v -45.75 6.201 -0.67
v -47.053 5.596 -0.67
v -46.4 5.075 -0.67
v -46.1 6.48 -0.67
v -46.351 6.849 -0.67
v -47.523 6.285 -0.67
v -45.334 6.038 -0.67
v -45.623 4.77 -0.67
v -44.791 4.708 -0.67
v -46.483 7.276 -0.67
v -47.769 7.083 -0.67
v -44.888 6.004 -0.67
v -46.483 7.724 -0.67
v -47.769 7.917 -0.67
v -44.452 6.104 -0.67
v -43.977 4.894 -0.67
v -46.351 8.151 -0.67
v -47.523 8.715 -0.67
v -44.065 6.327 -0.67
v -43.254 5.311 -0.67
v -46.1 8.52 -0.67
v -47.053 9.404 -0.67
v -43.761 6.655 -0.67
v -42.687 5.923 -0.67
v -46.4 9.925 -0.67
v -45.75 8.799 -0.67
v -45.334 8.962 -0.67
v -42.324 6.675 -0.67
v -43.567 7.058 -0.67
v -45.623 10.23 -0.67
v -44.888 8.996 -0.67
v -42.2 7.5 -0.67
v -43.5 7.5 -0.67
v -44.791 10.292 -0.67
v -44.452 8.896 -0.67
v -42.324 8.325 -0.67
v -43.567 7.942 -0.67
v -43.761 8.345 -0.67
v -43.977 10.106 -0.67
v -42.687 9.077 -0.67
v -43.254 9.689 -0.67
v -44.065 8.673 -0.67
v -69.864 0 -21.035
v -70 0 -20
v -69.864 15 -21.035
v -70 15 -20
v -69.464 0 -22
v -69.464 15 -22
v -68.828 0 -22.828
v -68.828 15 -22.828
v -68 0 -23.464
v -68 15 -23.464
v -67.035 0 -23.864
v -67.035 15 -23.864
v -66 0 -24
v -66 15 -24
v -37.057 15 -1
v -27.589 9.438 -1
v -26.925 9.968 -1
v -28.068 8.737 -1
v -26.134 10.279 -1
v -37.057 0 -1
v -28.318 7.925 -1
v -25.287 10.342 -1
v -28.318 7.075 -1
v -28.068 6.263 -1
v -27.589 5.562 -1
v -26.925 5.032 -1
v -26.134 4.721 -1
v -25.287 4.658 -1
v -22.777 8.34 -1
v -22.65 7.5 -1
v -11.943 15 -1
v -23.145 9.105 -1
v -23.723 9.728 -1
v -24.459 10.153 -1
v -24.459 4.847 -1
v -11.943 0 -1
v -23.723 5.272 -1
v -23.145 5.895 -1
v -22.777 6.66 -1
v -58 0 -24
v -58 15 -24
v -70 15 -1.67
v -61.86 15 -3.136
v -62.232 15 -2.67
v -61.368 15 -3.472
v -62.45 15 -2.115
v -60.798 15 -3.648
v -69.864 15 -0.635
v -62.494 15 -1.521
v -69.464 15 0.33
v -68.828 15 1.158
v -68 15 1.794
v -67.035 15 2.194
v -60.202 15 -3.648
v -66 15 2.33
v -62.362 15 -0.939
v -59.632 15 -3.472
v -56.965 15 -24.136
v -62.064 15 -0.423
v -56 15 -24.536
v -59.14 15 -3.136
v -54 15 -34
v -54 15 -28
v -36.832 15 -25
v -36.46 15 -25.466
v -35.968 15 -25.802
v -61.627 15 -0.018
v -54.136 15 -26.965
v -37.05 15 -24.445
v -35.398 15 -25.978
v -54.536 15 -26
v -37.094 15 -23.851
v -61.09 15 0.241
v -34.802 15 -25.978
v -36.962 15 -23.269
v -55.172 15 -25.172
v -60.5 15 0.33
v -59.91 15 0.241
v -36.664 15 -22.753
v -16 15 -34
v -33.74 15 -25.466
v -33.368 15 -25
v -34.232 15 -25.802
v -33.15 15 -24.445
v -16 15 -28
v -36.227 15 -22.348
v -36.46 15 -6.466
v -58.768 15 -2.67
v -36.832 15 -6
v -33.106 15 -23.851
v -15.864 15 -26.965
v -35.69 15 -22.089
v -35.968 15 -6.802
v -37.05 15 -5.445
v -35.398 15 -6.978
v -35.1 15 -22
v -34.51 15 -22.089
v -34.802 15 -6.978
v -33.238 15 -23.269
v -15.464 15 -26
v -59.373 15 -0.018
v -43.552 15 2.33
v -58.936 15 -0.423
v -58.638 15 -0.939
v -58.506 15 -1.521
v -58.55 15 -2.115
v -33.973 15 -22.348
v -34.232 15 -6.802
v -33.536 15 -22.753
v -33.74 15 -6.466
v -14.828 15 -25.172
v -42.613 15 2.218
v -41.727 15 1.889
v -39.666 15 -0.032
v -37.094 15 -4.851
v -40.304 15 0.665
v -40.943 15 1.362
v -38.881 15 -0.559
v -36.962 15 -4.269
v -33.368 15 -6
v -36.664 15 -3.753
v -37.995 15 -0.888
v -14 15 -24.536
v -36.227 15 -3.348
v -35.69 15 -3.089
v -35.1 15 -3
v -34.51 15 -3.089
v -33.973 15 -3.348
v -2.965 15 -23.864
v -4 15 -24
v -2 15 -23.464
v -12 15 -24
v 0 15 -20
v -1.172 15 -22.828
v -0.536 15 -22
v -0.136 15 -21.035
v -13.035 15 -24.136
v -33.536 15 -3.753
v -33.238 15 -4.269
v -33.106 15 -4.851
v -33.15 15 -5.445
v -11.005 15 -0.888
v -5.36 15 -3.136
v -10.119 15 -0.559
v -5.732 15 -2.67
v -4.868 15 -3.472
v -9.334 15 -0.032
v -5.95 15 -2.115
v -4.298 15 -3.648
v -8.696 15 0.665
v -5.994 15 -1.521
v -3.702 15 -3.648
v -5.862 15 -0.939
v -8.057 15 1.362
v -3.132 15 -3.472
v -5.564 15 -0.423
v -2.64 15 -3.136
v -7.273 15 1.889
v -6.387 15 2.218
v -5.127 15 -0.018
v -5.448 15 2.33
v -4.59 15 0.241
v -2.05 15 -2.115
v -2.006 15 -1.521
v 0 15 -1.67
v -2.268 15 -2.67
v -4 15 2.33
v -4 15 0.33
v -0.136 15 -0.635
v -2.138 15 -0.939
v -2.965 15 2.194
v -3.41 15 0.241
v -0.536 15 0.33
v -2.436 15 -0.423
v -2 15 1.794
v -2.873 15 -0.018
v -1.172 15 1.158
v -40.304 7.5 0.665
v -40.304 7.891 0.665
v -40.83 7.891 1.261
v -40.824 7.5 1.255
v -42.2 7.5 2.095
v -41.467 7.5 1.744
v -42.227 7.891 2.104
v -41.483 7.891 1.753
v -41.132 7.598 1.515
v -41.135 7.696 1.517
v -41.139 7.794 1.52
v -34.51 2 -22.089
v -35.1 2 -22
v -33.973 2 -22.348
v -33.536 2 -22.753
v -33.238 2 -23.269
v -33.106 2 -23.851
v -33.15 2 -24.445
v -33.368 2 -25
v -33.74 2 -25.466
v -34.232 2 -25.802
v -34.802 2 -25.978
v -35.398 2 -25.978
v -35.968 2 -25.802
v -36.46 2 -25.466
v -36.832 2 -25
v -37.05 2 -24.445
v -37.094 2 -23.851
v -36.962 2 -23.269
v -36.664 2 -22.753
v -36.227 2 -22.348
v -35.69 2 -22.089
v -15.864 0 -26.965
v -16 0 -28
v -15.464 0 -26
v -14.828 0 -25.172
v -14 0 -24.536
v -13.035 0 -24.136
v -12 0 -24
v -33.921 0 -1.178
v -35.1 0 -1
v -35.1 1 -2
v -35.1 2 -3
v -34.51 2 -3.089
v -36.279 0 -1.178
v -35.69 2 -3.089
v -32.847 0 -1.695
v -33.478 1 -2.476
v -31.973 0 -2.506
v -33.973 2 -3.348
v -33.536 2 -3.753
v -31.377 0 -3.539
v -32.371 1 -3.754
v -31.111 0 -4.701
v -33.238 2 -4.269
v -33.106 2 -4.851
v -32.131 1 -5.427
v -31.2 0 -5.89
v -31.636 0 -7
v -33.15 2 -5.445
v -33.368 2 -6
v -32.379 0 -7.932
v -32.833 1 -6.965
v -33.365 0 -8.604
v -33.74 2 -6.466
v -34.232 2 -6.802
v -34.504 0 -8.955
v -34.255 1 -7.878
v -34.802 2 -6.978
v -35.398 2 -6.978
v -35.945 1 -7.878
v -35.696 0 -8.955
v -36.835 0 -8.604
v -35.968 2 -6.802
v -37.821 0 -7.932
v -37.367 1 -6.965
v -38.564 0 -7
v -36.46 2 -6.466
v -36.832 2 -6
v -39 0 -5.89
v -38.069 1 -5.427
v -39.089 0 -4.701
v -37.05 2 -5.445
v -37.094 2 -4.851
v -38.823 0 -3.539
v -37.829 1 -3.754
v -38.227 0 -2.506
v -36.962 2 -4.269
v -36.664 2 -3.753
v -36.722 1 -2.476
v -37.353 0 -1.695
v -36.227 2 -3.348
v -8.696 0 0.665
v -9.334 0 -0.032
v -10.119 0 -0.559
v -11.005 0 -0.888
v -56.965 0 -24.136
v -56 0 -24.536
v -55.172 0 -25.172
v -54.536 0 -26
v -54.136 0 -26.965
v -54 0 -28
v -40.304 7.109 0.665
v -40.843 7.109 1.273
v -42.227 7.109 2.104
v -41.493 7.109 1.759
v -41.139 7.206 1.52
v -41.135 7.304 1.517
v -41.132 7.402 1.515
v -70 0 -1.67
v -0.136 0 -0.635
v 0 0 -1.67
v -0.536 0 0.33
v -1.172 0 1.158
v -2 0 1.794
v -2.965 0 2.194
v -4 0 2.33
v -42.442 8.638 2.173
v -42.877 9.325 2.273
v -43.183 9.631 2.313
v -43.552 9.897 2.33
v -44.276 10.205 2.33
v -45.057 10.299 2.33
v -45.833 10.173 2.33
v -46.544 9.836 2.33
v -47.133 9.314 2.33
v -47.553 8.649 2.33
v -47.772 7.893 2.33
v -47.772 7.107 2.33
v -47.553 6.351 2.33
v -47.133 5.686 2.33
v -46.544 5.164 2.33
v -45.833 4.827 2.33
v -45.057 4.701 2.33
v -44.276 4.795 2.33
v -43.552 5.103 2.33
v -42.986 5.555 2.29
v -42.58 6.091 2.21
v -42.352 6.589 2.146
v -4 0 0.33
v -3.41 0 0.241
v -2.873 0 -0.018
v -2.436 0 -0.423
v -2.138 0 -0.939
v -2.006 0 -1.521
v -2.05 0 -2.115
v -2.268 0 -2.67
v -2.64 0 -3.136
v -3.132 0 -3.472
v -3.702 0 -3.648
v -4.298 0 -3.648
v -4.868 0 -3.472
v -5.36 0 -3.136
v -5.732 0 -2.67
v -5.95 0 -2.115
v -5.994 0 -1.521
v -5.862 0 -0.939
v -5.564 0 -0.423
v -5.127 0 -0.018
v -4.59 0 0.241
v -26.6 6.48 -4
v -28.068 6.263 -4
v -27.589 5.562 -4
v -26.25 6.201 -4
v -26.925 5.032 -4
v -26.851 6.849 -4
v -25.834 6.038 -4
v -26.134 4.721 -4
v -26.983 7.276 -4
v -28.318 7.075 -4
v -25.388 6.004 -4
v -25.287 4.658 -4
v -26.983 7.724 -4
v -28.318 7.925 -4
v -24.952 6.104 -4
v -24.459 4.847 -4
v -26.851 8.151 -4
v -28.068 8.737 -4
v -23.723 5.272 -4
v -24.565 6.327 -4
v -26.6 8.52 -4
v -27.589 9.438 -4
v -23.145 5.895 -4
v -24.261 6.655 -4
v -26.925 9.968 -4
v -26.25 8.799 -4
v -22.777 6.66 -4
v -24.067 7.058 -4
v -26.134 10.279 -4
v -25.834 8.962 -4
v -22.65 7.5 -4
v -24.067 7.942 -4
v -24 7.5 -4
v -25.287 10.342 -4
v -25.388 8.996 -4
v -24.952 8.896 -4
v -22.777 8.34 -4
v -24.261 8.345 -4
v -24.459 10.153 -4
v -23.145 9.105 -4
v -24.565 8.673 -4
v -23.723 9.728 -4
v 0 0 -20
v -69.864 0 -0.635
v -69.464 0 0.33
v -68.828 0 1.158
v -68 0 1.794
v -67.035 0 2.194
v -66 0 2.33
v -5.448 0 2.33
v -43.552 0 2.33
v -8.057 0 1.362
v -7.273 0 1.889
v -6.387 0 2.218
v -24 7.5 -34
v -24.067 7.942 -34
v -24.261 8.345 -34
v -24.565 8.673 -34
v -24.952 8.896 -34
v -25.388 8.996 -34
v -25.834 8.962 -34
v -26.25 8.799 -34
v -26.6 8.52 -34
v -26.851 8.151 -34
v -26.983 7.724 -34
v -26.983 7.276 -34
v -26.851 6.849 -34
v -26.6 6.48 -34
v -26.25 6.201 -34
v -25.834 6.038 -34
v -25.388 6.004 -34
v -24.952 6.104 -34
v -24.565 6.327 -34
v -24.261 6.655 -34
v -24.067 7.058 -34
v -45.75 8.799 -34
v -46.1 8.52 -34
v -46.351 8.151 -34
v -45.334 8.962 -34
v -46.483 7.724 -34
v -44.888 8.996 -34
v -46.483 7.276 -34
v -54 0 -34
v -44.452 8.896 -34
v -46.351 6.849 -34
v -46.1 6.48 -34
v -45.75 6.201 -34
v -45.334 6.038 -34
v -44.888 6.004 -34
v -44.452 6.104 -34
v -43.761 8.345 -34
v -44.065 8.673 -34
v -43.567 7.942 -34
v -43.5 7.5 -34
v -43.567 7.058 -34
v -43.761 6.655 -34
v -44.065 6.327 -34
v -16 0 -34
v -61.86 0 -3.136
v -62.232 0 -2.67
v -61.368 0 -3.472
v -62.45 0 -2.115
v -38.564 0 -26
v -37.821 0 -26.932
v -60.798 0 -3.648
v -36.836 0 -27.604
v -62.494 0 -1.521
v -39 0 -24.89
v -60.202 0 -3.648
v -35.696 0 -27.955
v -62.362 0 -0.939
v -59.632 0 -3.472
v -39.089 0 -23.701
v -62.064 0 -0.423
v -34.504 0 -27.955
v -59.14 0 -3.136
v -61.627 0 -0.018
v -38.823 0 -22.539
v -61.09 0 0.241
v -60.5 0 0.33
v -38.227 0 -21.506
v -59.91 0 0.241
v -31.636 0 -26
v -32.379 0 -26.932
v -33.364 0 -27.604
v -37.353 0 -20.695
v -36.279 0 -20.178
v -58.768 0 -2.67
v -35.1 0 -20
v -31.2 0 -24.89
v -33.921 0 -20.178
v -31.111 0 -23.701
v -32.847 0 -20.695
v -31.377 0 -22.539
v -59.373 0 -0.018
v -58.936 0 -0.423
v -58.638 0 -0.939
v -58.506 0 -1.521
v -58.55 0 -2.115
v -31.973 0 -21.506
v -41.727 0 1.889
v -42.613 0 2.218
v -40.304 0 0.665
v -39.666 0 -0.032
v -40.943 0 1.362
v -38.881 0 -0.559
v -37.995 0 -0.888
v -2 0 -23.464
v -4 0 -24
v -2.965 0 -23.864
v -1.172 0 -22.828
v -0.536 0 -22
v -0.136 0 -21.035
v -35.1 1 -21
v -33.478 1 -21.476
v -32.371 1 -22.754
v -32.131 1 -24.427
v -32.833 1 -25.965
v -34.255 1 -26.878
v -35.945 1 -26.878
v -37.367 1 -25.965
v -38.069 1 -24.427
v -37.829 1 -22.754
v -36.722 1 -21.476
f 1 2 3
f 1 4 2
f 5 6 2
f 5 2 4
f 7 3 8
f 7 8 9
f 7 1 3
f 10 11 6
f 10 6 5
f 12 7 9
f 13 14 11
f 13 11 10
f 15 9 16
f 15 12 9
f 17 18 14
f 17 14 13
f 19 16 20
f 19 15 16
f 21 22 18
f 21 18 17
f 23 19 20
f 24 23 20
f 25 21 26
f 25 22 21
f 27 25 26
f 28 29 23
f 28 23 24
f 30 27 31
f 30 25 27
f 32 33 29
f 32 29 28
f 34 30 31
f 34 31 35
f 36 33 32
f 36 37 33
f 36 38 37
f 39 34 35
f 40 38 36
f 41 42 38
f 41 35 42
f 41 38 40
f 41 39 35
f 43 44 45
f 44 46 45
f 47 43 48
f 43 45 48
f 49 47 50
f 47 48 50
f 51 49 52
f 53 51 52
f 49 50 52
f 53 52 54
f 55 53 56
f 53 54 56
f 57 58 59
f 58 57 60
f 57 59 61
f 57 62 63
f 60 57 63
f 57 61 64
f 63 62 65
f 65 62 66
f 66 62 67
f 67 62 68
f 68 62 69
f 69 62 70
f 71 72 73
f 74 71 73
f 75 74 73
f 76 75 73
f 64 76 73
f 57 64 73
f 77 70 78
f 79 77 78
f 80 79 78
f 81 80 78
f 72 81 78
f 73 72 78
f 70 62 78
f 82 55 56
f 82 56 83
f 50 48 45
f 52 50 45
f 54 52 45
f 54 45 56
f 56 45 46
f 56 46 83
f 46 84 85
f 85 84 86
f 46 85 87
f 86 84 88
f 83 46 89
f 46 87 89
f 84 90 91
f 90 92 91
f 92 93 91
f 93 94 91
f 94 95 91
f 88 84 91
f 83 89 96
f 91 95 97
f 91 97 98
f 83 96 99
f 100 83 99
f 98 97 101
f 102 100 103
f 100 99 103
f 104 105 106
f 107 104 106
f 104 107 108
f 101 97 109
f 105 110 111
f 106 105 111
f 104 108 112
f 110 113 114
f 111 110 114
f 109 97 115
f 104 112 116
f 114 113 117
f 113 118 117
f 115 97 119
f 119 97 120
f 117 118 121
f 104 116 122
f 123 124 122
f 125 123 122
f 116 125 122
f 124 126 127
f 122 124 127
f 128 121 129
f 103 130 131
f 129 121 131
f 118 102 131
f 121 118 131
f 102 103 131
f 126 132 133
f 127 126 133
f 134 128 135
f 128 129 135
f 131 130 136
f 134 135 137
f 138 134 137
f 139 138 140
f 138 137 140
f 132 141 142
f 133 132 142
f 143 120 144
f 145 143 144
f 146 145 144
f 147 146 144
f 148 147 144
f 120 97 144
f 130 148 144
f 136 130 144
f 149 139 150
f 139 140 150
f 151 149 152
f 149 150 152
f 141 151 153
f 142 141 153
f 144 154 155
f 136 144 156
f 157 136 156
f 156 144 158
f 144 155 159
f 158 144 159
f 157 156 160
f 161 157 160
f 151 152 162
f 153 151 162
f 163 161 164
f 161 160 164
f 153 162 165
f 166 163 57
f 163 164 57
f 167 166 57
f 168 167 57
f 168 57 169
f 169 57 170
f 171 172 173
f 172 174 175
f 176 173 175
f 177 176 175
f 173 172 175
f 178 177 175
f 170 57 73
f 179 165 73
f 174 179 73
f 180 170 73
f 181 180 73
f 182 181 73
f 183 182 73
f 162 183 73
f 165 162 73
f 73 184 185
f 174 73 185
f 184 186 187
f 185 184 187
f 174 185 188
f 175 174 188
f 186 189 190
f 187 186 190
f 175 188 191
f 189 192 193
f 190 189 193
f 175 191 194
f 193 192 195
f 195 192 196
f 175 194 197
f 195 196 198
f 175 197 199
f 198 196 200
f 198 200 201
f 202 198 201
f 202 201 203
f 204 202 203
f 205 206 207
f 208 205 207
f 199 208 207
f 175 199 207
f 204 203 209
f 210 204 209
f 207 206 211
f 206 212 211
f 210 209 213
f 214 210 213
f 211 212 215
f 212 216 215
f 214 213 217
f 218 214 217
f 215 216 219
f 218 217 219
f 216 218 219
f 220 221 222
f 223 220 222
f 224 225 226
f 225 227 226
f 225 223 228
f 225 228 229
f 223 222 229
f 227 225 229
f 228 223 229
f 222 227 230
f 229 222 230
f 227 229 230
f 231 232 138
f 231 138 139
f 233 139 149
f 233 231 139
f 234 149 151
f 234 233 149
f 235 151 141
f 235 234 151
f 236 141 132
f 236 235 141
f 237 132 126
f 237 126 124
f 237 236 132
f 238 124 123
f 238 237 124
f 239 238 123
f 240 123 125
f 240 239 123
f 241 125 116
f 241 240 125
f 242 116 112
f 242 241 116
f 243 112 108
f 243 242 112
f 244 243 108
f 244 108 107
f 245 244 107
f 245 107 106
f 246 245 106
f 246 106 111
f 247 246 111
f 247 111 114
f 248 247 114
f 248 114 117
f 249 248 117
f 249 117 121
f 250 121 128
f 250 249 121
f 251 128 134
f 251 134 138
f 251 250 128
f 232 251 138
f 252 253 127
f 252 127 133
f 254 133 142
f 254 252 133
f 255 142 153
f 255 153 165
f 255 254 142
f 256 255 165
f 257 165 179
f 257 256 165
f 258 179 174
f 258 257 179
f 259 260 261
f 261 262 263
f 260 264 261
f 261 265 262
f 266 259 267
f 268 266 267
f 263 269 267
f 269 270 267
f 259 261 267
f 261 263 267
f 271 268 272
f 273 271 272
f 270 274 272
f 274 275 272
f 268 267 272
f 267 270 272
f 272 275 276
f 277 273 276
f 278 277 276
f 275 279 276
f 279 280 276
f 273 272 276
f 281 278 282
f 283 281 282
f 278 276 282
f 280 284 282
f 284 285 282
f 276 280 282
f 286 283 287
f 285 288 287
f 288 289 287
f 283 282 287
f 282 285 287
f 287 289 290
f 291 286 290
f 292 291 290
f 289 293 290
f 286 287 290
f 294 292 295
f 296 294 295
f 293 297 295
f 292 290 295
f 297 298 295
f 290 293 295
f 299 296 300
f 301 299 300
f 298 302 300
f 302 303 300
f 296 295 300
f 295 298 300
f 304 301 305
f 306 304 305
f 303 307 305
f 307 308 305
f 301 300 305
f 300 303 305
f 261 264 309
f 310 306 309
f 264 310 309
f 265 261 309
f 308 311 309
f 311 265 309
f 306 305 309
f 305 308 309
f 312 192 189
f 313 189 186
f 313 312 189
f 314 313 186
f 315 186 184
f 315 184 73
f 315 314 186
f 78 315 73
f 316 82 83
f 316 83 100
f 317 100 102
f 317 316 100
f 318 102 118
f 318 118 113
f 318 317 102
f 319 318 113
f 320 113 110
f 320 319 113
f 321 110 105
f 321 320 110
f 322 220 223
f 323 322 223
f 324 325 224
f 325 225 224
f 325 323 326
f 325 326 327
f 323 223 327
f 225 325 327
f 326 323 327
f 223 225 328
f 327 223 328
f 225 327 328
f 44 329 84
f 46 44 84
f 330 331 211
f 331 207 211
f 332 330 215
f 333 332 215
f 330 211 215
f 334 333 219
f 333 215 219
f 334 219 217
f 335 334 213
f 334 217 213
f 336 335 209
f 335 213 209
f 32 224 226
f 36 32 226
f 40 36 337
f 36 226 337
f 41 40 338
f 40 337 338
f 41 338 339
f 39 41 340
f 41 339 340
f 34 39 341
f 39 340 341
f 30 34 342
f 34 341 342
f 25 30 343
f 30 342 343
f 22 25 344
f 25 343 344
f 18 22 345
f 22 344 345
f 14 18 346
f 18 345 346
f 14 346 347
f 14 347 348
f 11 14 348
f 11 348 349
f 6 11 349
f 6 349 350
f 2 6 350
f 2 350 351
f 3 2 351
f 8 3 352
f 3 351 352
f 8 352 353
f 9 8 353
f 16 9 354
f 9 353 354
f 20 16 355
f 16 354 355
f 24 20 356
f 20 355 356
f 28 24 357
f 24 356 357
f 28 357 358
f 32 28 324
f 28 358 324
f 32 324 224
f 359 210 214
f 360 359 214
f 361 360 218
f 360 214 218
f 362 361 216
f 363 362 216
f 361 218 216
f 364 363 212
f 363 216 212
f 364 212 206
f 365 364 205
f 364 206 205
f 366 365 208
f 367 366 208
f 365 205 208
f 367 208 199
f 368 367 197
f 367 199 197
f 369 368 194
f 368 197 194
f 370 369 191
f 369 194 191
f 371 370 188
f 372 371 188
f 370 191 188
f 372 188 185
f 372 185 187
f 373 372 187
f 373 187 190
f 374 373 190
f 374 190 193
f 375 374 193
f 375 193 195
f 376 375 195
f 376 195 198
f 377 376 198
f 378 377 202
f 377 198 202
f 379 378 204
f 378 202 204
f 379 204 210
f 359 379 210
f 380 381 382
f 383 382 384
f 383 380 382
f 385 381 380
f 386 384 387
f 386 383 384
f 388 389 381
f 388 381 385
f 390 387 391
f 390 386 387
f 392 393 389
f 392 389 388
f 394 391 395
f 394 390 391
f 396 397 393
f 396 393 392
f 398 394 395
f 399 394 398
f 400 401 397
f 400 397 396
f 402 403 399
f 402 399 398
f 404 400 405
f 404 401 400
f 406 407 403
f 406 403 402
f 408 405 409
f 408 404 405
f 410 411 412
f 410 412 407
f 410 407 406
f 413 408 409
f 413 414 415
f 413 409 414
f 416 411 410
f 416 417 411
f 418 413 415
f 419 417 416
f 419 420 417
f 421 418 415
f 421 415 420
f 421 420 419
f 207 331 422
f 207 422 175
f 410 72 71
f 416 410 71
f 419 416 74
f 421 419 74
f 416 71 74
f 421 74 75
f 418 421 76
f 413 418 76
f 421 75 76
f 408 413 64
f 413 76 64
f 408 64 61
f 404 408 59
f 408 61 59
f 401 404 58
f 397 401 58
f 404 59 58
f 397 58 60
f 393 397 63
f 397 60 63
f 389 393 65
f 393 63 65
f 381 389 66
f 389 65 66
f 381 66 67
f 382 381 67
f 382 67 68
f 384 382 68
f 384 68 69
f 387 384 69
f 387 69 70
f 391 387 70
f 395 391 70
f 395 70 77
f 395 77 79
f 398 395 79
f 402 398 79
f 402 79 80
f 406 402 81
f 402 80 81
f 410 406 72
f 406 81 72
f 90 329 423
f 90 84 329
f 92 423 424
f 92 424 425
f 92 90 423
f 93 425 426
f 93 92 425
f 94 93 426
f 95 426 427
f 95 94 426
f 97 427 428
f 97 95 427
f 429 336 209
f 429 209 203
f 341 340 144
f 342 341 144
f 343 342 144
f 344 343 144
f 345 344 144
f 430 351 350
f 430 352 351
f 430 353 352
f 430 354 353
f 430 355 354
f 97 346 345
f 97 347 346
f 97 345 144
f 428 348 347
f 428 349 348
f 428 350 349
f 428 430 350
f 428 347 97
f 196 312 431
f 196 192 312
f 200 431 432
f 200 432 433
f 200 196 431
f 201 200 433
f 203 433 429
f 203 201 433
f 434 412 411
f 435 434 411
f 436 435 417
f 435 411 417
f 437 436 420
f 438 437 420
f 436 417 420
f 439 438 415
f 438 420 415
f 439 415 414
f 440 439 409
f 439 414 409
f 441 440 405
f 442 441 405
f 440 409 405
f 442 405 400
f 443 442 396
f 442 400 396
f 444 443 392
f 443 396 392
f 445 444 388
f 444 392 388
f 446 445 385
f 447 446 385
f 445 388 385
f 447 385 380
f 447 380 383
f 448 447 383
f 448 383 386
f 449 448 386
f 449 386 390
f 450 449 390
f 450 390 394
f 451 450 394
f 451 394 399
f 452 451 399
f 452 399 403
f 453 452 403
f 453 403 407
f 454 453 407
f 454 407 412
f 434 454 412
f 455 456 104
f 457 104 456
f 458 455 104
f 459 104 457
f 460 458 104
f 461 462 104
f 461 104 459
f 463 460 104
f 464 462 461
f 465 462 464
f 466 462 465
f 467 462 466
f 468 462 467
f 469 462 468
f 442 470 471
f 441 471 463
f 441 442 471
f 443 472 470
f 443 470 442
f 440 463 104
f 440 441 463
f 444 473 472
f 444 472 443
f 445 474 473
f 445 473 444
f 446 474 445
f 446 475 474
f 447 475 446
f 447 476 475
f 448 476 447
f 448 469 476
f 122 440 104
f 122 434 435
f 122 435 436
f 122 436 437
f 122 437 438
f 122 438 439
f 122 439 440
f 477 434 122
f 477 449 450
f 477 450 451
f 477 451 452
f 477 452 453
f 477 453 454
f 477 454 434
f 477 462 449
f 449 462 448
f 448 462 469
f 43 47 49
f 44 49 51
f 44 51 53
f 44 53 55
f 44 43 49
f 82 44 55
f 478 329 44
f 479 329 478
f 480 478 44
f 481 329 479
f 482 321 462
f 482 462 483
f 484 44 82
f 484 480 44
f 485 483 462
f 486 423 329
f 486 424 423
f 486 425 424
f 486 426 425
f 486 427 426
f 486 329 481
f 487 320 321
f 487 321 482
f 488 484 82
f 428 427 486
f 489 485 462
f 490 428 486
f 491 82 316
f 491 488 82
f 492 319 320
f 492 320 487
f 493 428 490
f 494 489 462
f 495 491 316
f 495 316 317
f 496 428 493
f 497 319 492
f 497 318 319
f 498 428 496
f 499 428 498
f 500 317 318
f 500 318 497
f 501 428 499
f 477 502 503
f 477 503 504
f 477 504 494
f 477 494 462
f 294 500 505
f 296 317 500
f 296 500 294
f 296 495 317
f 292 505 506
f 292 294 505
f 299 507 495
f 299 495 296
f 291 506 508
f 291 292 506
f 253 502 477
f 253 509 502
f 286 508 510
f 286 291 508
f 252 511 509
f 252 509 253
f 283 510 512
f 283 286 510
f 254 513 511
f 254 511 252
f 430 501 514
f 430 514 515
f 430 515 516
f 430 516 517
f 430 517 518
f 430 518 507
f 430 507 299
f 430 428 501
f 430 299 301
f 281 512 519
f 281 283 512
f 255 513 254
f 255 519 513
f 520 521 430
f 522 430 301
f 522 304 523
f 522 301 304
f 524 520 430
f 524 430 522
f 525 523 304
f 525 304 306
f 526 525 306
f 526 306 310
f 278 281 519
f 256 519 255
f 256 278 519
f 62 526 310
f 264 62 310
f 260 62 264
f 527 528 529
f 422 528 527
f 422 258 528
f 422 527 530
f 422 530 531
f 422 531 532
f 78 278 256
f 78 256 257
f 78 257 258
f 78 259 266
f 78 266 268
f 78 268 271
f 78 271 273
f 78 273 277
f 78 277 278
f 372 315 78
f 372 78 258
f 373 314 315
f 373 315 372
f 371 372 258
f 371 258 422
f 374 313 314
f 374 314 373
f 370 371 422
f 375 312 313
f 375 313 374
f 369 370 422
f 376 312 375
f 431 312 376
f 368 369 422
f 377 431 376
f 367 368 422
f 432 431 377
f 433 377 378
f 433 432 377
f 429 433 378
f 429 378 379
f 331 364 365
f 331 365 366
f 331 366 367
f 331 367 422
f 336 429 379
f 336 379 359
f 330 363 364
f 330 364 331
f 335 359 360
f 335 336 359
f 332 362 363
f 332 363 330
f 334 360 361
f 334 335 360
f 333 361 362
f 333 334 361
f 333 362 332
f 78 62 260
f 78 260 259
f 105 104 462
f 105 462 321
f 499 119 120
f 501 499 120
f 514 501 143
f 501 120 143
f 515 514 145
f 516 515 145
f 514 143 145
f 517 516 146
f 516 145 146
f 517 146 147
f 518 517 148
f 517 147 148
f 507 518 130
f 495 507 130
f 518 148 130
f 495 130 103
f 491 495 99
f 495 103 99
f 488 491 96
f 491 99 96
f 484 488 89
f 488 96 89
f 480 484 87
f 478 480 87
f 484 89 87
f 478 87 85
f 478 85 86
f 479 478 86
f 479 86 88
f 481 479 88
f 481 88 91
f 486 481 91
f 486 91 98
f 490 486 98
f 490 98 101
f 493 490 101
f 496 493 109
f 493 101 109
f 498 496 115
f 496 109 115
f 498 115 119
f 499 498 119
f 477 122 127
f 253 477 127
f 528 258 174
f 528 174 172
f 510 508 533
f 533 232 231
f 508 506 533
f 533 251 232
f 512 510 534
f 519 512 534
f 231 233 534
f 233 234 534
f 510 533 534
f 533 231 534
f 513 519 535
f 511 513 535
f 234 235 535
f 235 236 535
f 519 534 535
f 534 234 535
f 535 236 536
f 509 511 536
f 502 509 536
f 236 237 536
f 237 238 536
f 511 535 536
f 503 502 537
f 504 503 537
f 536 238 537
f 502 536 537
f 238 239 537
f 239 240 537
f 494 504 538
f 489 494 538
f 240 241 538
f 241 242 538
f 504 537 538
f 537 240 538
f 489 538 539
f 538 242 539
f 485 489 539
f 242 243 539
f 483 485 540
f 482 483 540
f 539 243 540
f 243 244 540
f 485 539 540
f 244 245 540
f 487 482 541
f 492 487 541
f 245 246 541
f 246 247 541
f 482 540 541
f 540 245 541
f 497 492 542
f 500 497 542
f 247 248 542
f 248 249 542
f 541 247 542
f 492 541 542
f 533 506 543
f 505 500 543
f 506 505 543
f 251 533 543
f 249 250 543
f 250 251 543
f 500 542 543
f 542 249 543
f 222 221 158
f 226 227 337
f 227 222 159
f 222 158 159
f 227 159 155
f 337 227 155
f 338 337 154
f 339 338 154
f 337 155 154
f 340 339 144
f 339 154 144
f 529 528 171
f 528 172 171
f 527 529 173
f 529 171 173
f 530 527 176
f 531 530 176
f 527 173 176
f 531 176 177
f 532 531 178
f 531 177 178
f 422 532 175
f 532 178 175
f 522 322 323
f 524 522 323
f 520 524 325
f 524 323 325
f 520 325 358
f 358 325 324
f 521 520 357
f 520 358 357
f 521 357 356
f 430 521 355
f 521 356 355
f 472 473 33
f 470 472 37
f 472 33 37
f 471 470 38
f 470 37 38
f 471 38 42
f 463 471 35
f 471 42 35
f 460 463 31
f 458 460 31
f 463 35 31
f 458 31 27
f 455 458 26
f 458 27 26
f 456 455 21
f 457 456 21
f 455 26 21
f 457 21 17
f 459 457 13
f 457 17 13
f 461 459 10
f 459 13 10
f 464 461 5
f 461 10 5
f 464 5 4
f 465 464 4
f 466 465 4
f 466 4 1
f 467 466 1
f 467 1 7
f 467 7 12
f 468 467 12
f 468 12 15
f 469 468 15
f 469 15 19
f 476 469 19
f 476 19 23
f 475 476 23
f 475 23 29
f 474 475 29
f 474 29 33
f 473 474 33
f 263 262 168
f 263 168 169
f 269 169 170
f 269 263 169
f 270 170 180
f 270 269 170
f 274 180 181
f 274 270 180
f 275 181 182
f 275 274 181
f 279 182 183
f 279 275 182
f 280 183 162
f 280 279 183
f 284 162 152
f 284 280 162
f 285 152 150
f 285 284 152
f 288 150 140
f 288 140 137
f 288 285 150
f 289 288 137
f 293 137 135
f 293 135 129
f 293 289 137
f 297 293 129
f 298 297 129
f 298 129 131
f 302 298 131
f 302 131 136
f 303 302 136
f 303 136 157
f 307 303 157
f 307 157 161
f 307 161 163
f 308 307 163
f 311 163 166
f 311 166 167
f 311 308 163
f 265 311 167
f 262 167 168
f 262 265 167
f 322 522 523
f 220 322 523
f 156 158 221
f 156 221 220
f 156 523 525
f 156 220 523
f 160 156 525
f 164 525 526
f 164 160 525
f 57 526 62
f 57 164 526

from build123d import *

# Parameters (mm, degrees)
SKETCH1_W           = 70
SKETCH1_H           = 34
SKETCH1_R           = 2
BOSS_EXTRUDE1_DEPTH = 15
SKETCH6_W           = 70
SKETCH6_H           = 15
BOSS_EXTRUDE2_DEPTH = 5
SKETCH3_R           = 2
CUT_EXTRUDE2_DEPTH  = 15
SKETCH8_W           = 6
SKETCH8_H           = 5
CUT_EXTRUDE3_DEPTH  = 15
SKETCH9_W           = 12
SKETCH9_H           = 6
CUT_EXTRUDE4_DEPTH  = 15
SKETCH10_W          = 16
SKETCH10_H          = 10
CUT_EXTRUDE5_DEPTH  = 17
SKETCH12_R          = 1.5
CUT_EXTRUDE6_DEPTH  = 41
SKETCH13_W          = 27.5
SKETCH13_H          = 6
CUT_EXTRUDE7_DEPTH  = 20
SKETCH14_W          = 13.5
SKETCH14_H          = 2.67
SKETCH14_W_2        = 29
CUT_EXTRUDE8_DEPTH  = 17
FILLET2_R           = 4
SKETCH16_W          = 5.5
SKETCH16_H          = 3.33
CUT_EXTRUDE10_DEPTH = 18
FILLET4_R           = 4
FILLET5_R           = 4
SKETCH17_R          = 2.85
CUT_EXTRUDE11_DEPTH = 3
SKETCH18_R          = 2.8
CUT_EXTRUDE12_DEPTH = 3
CHAMFER1_SIZE       = 2
CHAMFER2_SIZE       = 2


# Some blends are built 0.0001 mm under size
with BuildPart() as part:
    # Sketch1 → Boss-Extrude1 (new body)
    with BuildSketch(Plane(origin=(0, 0, 0), x_dir=(1, 0, 0), z_dir=(0, 1, 0))):
        with Locations((-35, 17)):
            Rectangle(SKETCH1_W, SKETCH1_H)
        with Locations(Location((-35.1, 24, 0), (0, 0, 270))):
            Circle(SKETCH1_R, mode=Mode.SUBTRACT)
        with Locations(Location((-35.1, 5, 0), (0, 0, 270))):
            Circle(SKETCH1_R, mode=Mode.SUBTRACT)
    extrude(amount=BOSS_EXTRUDE1_DEPTH)

    # Sketch6 → Boss-Extrude2 (add)
    with BuildSketch(Plane.XY):
        with Locations((-35, 7.5)):
            Rectangle(SKETCH6_W, SKETCH6_H)
    extrude(amount=BOSS_EXTRUDE2_DEPTH)

    # Sketch3 → Cut-Extrude2 (cut)
    with BuildSketch(Plane(origin=(0, 15, 0), x_dir=(1, 0, 0), z_dir=(0, 1, 0))):
        with Locations(Location((-4, 1.67, 0), (0, 0, 270))):
            Circle(SKETCH3_R)
        with Locations(Location((-60.5, 1.67, 0), (0, 0, 270))):
            Circle(SKETCH3_R)
    extrude(amount=-CUT_EXTRUDE2_DEPTH, mode=Mode.SUBTRACT)

    # Sketch8 → Cut-Extrude3 (cut)
    with BuildSketch(Plane(origin=(0, 15, 0), x_dir=(1, 0, 0), z_dir=(0, 1, 0))):
        with Locations((-16.5, -2.5)):
            Rectangle(SKETCH8_W, SKETCH8_H)
    extrude(amount=-CUT_EXTRUDE3_DEPTH, mode=Mode.SUBTRACT)

    # Sketch9 → Cut-Extrude4 (cut)
    with BuildSketch(Plane(origin=(0, 15, 0), x_dir=(1, 0, 0), z_dir=(0, 1, 0))):
        with Locations((-35, -2)):
            Rectangle(SKETCH9_W, SKETCH9_H)
    extrude(amount=-CUT_EXTRUDE4_DEPTH, mode=Mode.SUBTRACT)

    # Sketch10 → Cut-Extrude5 (cut)
    with BuildSketch(Plane.XZ):
        with Locations((-8, -29)):
            Rectangle(SKETCH10_W, SKETCH10_H)
        with Locations((-62, -29)):
            Rectangle(SKETCH10_W, SKETCH10_H)
    extrude(amount=-CUT_EXTRUDE5_DEPTH, mode=Mode.SUBTRACT)

    # Sketch12 → Cut-Extrude6 (cut)
    with BuildSketch(Plane.XY.offset(5)):
        with Locations((-45, 7.5)):
            Circle(SKETCH12_R)
        with Locations((-25.499999999, 7.499999999)):
            Circle(SKETCH12_R)
    extrude(amount=-CUT_EXTRUDE6_DEPTH, mode=Mode.SUBTRACT)

    # Sketch13 → Cut-Extrude7 (cut)
    with BuildSketch(Plane(origin=(0, 15, 0), x_dir=(1, 0, 0), z_dir=(0, 1, 0))):
        with Locations((-27.25, -2)):
            Rectangle(SKETCH13_W, SKETCH13_H)
    extrude(amount=-CUT_EXTRUDE7_DEPTH, mode=Mode.SUBTRACT)

    # Sketch14 → Cut-Extrude8 (cut)
    with BuildSketch(Plane(origin=(0, 0, 0), x_dir=(-1, 0, 0), z_dir=(0, -1, 0))):
        with Locations((6.75, -3.665)):
            Rectangle(SKETCH14_W, SKETCH14_H)
        with Locations((55.5, -3.665)):
            Rectangle(SKETCH14_W_2, SKETCH14_H)
    extrude(amount=-CUT_EXTRUDE8_DEPTH, mode=Mode.SUBTRACT)

    # Fillet2
    fillet2_edges = [part.edges().sort_by_distance(p)[0] for p in [
        (0, 7.5, 2.33),
        (-70, 7.5, 2.33),
        (-70, 7.5, -24),
        (0, 7.5, -24),
    ]]
    fillet(fillet2_edges, radius=FILLET2_R)

    # Sketch16 → Cut-Extrude10 (cut)
    with BuildSketch(Plane.XZ):
        with Locations((-10.75, 0.665)):
            Rectangle(SKETCH16_W, SKETCH16_H)
    extrude(amount=-CUT_EXTRUDE10_DEPTH, mode=Mode.SUBTRACT)

    # Fillet4
    # the kernel refuses this fillet: 4 mm, written as the material it adds along each edge
    with BuildSketch(Plane(origin=(-16, 0, -24), x_dir=(1, 0, 0), z_dir=(0, 1, 0)), Plane(origin=(-54, 0, -24), x_dir=(0, 0, -1), z_dir=(0, 1, 0))) as fillet4_piece_1:
        with BuildLine():
            CenterArc((FILLET4_R, FILLET4_R), FILLET4_R, 180, 90)
            Line((0, FILLET4_R), (-FILLET4_R * 0.02, FILLET4_R))
            Line((-FILLET4_R * 0.02, FILLET4_R), (-FILLET4_R * 0.02, -FILLET4_R * 0.02))
            Line((-FILLET4_R * 0.02, -FILLET4_R * 0.02), (FILLET4_R, -FILLET4_R * 0.02))
            Line((FILLET4_R, -FILLET4_R * 0.02), (FILLET4_R, 0))
        make_face()
    extrude(amount=15)
    with BuildSketch(Plane(origin=(-41, 15, -1), x_dir=(0, 0, 1), z_dir=(0, -1, 0))) as fillet4_piece_2:
        with BuildLine():
            CenterArc((4, -3.943488304), FILLET4_R, 99.642495459, 80.357504541)
            Line((0, -3.943488304), (-0.08, -3.943488304))
            Line((-0.08, -3.943488304), (-0.08, 0))
            Line((-0.08, 0), (0, 0.08))
            ThreePointArc((0, 0.08), (1.665, 0.08), (3.3166, 0.078869766))
            Line((3.3166, 0.078869766), (3.33, 0))
        make_face()
    extrude(amount=15)
    with BuildSketch(Plane(origin=(-8, 0, -1), x_dir=(-1.0, 0, -8.691057696161095e-11), z_dir=(0, 1, 0))) as fillet4_piece_3:
        with BuildLine():
            CenterArc((3.943488303, 4), FILLET4_R, 189.642495464, 80.357504541)
            Line((0, 3.33), (-0.078869766, 3.3166))
            ThreePointArc((-0.078869766, 3.3166), (-0.08, 1.665), (-0.08, 0))
            Line((-0.08, 0), (0, -0.08))
            Line((0, -0.08), (3.943488304, -0.08))
            Line((3.943488304, -0.08), (3.943488304, 0))
        make_face()
    extrude(amount=15)

    # Fillet5
    fillet5_edges = [part.edges().sort_by_distance(p)[0] for p in [
        (-41, 7.5, 2.33),
        (-8, 7.5, 2.33),
    ]]
    fillet(fillet5_edges, radius=FILLET5_R)

    # Sketch17 → Cut-Extrude11 (cut)
    with BuildSketch(Plane.XY.offset(-1)):
        with Locations((-25.499999999, 7.499999999)):
            Circle(SKETCH17_R)
    extrude(amount=-CUT_EXTRUDE11_DEPTH, mode=Mode.SUBTRACT)

    # Sketch18 → Cut-Extrude12 (cut)
    with BuildSketch(Plane.XY.offset(2.33)):
        with Locations((-45, 7.5)):
            Circle(SKETCH18_R)
    extrude(amount=-CUT_EXTRUDE12_DEPTH, mode=Mode.SUBTRACT)

    # Chamfer1
    chamfer1_edges = [part.edges().sort_by_distance(p)[0] for p in [
        (-35.1, 0, -26),
    ]]
    chamfer(chamfer1_edges, length=CHAMFER1_SIZE)

    # Chamfer2
    chamfer2_edges = [part.edges().sort_by_distance(p)[0] for p in [
        (-35.1, 0, -7),
    ]]
    chamfer(chamfer2_edges, length=CHAMFER2_SIZE - 0.0001)  # a hair under: the kernel refuses the full size


solid = part.part
